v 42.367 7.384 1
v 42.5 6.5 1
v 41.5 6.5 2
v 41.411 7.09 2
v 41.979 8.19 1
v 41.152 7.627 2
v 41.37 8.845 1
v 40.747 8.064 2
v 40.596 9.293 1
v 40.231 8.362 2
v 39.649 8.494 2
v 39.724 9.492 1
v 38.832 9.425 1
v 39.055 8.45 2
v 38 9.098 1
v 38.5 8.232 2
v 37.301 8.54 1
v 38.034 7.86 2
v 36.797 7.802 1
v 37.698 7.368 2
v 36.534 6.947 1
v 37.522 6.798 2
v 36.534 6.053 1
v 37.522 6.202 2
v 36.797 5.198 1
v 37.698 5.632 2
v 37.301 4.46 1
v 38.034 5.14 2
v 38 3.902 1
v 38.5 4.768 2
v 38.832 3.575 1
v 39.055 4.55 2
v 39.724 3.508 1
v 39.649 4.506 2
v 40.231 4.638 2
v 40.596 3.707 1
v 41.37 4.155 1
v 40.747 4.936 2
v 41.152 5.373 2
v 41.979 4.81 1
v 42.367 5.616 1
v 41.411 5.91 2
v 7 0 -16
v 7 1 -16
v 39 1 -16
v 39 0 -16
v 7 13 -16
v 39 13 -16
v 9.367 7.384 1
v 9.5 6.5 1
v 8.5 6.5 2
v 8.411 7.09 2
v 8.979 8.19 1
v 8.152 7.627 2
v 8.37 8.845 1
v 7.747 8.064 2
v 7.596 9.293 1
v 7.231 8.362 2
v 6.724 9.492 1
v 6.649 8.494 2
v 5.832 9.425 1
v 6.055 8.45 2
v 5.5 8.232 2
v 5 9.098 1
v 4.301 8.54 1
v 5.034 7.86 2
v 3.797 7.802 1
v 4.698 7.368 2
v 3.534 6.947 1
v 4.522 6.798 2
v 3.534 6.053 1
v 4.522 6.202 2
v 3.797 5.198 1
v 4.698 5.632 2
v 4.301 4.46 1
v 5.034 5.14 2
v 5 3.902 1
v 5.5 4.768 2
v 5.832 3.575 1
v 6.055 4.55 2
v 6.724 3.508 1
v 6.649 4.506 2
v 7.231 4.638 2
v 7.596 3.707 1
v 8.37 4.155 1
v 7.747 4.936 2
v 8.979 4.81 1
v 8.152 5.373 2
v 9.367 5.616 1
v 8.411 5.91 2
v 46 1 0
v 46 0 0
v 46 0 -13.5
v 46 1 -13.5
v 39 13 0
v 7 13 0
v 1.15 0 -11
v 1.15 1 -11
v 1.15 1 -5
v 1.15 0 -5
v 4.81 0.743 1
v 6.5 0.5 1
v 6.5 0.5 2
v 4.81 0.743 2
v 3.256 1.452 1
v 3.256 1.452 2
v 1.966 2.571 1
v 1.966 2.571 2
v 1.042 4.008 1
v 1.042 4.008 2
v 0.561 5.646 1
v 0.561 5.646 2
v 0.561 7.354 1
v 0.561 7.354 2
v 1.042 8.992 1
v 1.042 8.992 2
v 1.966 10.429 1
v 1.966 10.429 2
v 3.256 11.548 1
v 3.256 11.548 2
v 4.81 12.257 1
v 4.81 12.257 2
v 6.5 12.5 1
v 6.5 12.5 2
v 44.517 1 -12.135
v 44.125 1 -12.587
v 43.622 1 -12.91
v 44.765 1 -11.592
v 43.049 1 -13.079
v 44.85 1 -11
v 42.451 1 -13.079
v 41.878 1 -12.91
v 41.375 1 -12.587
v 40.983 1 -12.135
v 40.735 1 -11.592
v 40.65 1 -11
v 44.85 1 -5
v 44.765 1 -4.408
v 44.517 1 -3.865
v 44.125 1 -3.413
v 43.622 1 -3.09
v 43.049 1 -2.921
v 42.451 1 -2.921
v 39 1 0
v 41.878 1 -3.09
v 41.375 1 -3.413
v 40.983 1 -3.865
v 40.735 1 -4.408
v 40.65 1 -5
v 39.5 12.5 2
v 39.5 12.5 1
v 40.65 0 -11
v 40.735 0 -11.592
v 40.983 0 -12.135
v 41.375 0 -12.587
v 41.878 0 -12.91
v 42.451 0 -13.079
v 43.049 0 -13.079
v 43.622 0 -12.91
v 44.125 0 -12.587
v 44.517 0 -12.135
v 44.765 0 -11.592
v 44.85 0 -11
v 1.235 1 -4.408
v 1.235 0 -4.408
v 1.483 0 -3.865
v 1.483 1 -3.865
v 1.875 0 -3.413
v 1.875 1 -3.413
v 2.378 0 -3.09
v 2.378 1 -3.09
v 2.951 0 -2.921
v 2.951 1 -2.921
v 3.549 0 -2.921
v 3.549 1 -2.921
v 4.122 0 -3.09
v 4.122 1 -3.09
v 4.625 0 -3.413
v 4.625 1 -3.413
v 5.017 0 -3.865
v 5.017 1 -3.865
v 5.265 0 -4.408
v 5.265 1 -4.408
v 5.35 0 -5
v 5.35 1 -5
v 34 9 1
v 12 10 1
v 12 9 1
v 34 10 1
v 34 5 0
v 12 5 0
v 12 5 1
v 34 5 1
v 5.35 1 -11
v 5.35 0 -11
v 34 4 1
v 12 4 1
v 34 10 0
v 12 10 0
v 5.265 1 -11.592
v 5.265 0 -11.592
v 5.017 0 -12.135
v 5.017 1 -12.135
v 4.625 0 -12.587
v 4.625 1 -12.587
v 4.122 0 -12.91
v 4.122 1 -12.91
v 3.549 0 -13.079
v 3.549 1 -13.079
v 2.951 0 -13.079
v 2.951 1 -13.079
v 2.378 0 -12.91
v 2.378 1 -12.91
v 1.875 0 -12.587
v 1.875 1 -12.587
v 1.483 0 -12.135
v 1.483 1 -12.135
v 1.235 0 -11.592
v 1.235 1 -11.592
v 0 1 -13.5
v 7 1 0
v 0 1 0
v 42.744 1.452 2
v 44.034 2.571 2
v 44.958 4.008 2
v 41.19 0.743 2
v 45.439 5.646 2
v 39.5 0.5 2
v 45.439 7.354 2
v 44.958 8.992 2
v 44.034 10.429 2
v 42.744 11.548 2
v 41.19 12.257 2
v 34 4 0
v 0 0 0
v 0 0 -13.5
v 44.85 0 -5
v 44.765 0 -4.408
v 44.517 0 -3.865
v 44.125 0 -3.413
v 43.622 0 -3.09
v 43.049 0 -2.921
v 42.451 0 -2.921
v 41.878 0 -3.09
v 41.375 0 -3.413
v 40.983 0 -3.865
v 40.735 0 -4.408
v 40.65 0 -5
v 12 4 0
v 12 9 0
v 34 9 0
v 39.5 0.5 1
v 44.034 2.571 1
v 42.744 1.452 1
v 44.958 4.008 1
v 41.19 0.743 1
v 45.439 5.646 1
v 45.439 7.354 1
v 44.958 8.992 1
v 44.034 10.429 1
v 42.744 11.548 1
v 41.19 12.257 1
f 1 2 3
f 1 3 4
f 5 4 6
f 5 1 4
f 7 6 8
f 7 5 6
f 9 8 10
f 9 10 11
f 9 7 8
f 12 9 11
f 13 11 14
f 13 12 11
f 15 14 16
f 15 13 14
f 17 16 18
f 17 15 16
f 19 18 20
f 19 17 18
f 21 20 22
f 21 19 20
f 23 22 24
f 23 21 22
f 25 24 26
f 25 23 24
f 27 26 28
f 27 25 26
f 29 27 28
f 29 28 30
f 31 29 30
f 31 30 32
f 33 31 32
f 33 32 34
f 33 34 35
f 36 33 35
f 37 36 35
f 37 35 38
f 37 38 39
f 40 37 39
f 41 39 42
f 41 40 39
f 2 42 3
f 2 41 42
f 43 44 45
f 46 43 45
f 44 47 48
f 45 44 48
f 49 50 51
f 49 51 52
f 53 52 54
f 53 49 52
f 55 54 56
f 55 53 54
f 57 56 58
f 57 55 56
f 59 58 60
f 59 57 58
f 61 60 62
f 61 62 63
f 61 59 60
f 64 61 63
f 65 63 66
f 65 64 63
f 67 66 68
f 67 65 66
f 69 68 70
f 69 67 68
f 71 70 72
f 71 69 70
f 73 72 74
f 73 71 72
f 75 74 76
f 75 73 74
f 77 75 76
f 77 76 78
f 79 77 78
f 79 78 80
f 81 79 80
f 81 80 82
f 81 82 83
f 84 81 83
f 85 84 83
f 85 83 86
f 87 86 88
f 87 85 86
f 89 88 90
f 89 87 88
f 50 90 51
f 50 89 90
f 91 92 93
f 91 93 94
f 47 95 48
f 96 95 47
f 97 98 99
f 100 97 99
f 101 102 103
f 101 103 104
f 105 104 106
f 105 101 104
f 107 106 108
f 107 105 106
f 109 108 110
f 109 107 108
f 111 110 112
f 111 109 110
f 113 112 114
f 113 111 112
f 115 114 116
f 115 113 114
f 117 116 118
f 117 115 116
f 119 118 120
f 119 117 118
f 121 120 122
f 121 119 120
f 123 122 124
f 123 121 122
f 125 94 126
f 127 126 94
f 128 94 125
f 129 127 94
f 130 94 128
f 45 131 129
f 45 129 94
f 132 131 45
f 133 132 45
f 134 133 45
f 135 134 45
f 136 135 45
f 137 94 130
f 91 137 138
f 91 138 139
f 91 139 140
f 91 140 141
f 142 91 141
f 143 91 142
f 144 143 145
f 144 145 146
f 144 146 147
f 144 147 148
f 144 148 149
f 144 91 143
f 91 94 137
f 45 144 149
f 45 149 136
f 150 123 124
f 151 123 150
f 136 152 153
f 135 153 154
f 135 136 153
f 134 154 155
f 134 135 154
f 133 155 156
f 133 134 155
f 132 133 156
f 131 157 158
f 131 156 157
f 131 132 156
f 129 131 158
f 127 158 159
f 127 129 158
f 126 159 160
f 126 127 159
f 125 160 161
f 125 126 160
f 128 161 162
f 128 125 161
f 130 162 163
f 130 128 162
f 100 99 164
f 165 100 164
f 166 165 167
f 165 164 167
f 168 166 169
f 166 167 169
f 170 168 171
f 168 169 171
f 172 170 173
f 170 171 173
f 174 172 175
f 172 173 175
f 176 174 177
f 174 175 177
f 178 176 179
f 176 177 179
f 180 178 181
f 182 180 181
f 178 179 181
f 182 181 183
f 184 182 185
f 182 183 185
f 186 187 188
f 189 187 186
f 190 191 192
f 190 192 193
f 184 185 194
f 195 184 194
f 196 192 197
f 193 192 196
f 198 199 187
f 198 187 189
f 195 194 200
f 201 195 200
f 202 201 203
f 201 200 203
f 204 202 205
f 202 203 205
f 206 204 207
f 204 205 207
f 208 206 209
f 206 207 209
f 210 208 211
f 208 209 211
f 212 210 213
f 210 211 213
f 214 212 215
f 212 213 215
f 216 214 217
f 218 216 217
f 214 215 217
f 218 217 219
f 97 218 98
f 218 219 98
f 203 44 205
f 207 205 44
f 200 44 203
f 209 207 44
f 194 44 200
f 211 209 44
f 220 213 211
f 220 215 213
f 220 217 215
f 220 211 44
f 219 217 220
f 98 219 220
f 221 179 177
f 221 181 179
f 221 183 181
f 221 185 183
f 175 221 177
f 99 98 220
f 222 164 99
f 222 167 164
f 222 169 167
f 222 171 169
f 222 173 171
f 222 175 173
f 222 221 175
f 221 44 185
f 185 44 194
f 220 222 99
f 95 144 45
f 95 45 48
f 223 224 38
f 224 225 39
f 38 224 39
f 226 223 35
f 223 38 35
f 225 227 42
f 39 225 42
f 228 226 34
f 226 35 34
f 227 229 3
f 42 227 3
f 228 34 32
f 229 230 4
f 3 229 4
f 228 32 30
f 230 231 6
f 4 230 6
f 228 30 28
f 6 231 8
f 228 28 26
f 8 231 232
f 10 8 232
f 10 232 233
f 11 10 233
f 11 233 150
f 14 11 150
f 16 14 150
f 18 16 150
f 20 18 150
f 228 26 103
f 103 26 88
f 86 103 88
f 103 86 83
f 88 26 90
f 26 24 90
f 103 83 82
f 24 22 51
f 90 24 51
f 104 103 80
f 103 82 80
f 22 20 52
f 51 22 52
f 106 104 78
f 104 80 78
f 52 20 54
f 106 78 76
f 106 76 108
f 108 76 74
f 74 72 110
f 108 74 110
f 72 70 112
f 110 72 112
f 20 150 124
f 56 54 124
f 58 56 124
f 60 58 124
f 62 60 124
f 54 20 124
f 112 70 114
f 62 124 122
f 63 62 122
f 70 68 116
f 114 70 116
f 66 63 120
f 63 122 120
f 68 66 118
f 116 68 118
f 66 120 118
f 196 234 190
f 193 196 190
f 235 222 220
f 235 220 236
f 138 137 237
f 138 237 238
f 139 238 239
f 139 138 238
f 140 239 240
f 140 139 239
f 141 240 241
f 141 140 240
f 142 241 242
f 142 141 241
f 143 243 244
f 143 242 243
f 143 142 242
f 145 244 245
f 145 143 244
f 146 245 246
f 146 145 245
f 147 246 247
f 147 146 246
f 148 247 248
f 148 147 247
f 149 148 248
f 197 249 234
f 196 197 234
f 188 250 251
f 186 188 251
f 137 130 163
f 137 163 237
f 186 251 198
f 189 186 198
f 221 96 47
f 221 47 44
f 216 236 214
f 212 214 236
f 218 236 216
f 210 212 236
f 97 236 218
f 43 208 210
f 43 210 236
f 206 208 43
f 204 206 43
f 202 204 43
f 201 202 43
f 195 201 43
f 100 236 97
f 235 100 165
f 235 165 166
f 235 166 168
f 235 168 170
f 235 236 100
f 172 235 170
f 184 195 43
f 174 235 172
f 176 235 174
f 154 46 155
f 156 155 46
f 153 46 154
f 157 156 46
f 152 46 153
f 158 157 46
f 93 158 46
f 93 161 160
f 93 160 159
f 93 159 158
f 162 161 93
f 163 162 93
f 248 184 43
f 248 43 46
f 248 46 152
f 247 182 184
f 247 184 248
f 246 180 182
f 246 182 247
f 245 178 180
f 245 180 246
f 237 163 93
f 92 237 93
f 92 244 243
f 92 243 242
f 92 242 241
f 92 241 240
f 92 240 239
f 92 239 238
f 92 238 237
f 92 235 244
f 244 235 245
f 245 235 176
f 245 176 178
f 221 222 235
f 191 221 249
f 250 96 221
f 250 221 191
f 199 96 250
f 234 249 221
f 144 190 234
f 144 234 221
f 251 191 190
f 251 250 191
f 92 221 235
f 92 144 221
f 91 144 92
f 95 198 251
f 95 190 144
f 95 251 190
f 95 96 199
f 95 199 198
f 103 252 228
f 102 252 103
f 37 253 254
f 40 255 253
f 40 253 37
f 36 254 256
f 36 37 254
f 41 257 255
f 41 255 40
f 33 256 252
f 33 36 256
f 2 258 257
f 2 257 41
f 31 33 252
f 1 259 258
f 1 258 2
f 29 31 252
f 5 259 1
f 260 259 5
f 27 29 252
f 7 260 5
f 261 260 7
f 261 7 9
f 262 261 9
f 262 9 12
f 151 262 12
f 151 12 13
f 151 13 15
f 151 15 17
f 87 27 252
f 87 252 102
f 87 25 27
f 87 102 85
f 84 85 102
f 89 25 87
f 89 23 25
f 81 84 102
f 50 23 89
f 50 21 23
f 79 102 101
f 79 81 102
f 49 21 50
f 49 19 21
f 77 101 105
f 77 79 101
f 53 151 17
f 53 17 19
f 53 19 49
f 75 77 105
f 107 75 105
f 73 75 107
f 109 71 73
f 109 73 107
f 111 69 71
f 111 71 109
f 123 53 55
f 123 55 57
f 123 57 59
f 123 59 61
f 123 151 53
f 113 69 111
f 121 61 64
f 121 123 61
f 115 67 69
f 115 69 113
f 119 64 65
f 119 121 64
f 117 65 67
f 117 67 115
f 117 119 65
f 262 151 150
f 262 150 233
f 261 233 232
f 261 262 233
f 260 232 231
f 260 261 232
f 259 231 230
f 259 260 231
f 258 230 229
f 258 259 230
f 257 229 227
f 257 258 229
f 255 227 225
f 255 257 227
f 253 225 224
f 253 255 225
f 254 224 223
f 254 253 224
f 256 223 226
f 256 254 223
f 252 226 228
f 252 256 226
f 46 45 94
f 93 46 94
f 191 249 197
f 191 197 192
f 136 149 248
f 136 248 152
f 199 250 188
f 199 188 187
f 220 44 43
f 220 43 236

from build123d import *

# Parameters (mm, degrees)
SKETCH_1_W          = 15
SKETCH_1_H          = 12
EXTRUDE_1_DEPTH     = 16
CUT_EXTRUDE_1_DEPTH = 16
CUT_EXTRUDE_2_DEPTH = 16
SKETCH_4_W          = 22
SKETCH_4_H          = 1
EXTRUDE_2_DEPTH     = 1
SKETCH_5_R          = 2
EXTRUDE_3_DEPTH     = 1
CHAMFER_1_SIZE      = 1


with BuildPart() as part:
    # 草图1 → 凸台-拉伸1 (new body)
    with BuildSketch(Plane.XY):
        with Locations((15.5, 6)):
            Rectangle(SKETCH_1_W, SKETCH_1_H)
        with Locations((30.5, 6)):
            Rectangle(SKETCH_1_W, SKETCH_1_H)
        Polygon((0, 1), (0, 0), (8, 0), (8, 12), (23, 12), (23, 13), (7, 13), (7, 1), align=None)
        Polygon((23, 13), (23, 12), (38, 12), (38, 0), (46, 0), (46, 1), (39, 1), (39, 13), align=None)
    extrude(amount=-EXTRUDE_1_DEPTH)

    # 草图2 → 切除-拉伸1 (cut)
    with BuildSketch(Plane(origin=(0, 1, 0), x_dir=(1, 0, 0), z_dir=(0, 1, 0))):
        with BuildLine():
            Line((40.65, 5), (40.65, 11))
            ThreePointArc((40.65, 11), (42.75, 13.1), (44.85, 11))
            Line((44.85, 11), (44.85, 5))
            ThreePointArc((44.85, 5), (42.75, 2.9), (40.65, 5))
        make_face()
        with BuildLine():
            Line((5.35, 5), (5.35, 11))
            ThreePointArc((5.35, 11), (3.25, 13.1), (1.15, 11))
            Line((1.15, 11), (1.15, 5))
            ThreePointArc((1.15, 5), (3.25, 2.9), (5.35, 5))
        make_face()
    extrude(amount=-CUT_EXTRUDE_1_DEPTH, mode=Mode.SUBTRACT)

    # 草图3 → 切除-拉伸2 (cut)
    with BuildSketch(Plane(origin=(0, 1, 0), x_dir=(1, 0, 0), z_dir=(0, 1, 0))):
        Polygon((39, 16), (46, 13.5), (46, 16), align=None)
        Polygon((0, 16), (7, 16), (0, 13.5), align=None)
    extrude(amount=-CUT_EXTRUDE_2_DEPTH, mode=Mode.SUBTRACT)

    # 草图4 → 凸台-拉伸2 (add)
    with BuildSketch(Plane.XY):
        with Locations((23, 9.5)):
            Rectangle(SKETCH_4_W, SKETCH_4_H)
        with Locations((23, 4.5)):
            Rectangle(SKETCH_4_W, SKETCH_4_H)
    extrude(amount=EXTRUDE_2_DEPTH)


with BuildPart() as body_2:
    # 草图5 → 凸台-拉伸3 (new body)
    with BuildSketch(Plane.XY.offset(1)):
        with BuildLine():
            Line((6.5, 12.5), (39.5, 12.5))
            ThreePointArc((39.5, 12.5), (45.5, 6.5), (39.5, 0.5))
            Line((39.5, 0.5), (6.5, 0.5))
            ThreePointArc((6.5, 0.5), (0.5, 6.5), (6.5, 12.5))
        make_face()
        with Locations((6.5, 6.5)):
            Circle(SKETCH_5_R, mode=Mode.SUBTRACT)
        with Locations((39.5, 6.5)):
            Circle(SKETCH_5_R, mode=Mode.SUBTRACT)
    extrude(amount=EXTRUDE_3_DEPTH)

    # 倒角1
    chamfer_1_edges = [body_2.edges().sort_by_distance(p)[0] for p in [
        (4.5, 6.5, 1),
        (37.5, 6.5, 1),
    ]]
    chamfer(chamfer_1_edges, length=CHAMFER_1_SIZE - 0.0001)  # a hair under: the kernel refuses the full size


solid = Compound([part.part, body_2.part])
